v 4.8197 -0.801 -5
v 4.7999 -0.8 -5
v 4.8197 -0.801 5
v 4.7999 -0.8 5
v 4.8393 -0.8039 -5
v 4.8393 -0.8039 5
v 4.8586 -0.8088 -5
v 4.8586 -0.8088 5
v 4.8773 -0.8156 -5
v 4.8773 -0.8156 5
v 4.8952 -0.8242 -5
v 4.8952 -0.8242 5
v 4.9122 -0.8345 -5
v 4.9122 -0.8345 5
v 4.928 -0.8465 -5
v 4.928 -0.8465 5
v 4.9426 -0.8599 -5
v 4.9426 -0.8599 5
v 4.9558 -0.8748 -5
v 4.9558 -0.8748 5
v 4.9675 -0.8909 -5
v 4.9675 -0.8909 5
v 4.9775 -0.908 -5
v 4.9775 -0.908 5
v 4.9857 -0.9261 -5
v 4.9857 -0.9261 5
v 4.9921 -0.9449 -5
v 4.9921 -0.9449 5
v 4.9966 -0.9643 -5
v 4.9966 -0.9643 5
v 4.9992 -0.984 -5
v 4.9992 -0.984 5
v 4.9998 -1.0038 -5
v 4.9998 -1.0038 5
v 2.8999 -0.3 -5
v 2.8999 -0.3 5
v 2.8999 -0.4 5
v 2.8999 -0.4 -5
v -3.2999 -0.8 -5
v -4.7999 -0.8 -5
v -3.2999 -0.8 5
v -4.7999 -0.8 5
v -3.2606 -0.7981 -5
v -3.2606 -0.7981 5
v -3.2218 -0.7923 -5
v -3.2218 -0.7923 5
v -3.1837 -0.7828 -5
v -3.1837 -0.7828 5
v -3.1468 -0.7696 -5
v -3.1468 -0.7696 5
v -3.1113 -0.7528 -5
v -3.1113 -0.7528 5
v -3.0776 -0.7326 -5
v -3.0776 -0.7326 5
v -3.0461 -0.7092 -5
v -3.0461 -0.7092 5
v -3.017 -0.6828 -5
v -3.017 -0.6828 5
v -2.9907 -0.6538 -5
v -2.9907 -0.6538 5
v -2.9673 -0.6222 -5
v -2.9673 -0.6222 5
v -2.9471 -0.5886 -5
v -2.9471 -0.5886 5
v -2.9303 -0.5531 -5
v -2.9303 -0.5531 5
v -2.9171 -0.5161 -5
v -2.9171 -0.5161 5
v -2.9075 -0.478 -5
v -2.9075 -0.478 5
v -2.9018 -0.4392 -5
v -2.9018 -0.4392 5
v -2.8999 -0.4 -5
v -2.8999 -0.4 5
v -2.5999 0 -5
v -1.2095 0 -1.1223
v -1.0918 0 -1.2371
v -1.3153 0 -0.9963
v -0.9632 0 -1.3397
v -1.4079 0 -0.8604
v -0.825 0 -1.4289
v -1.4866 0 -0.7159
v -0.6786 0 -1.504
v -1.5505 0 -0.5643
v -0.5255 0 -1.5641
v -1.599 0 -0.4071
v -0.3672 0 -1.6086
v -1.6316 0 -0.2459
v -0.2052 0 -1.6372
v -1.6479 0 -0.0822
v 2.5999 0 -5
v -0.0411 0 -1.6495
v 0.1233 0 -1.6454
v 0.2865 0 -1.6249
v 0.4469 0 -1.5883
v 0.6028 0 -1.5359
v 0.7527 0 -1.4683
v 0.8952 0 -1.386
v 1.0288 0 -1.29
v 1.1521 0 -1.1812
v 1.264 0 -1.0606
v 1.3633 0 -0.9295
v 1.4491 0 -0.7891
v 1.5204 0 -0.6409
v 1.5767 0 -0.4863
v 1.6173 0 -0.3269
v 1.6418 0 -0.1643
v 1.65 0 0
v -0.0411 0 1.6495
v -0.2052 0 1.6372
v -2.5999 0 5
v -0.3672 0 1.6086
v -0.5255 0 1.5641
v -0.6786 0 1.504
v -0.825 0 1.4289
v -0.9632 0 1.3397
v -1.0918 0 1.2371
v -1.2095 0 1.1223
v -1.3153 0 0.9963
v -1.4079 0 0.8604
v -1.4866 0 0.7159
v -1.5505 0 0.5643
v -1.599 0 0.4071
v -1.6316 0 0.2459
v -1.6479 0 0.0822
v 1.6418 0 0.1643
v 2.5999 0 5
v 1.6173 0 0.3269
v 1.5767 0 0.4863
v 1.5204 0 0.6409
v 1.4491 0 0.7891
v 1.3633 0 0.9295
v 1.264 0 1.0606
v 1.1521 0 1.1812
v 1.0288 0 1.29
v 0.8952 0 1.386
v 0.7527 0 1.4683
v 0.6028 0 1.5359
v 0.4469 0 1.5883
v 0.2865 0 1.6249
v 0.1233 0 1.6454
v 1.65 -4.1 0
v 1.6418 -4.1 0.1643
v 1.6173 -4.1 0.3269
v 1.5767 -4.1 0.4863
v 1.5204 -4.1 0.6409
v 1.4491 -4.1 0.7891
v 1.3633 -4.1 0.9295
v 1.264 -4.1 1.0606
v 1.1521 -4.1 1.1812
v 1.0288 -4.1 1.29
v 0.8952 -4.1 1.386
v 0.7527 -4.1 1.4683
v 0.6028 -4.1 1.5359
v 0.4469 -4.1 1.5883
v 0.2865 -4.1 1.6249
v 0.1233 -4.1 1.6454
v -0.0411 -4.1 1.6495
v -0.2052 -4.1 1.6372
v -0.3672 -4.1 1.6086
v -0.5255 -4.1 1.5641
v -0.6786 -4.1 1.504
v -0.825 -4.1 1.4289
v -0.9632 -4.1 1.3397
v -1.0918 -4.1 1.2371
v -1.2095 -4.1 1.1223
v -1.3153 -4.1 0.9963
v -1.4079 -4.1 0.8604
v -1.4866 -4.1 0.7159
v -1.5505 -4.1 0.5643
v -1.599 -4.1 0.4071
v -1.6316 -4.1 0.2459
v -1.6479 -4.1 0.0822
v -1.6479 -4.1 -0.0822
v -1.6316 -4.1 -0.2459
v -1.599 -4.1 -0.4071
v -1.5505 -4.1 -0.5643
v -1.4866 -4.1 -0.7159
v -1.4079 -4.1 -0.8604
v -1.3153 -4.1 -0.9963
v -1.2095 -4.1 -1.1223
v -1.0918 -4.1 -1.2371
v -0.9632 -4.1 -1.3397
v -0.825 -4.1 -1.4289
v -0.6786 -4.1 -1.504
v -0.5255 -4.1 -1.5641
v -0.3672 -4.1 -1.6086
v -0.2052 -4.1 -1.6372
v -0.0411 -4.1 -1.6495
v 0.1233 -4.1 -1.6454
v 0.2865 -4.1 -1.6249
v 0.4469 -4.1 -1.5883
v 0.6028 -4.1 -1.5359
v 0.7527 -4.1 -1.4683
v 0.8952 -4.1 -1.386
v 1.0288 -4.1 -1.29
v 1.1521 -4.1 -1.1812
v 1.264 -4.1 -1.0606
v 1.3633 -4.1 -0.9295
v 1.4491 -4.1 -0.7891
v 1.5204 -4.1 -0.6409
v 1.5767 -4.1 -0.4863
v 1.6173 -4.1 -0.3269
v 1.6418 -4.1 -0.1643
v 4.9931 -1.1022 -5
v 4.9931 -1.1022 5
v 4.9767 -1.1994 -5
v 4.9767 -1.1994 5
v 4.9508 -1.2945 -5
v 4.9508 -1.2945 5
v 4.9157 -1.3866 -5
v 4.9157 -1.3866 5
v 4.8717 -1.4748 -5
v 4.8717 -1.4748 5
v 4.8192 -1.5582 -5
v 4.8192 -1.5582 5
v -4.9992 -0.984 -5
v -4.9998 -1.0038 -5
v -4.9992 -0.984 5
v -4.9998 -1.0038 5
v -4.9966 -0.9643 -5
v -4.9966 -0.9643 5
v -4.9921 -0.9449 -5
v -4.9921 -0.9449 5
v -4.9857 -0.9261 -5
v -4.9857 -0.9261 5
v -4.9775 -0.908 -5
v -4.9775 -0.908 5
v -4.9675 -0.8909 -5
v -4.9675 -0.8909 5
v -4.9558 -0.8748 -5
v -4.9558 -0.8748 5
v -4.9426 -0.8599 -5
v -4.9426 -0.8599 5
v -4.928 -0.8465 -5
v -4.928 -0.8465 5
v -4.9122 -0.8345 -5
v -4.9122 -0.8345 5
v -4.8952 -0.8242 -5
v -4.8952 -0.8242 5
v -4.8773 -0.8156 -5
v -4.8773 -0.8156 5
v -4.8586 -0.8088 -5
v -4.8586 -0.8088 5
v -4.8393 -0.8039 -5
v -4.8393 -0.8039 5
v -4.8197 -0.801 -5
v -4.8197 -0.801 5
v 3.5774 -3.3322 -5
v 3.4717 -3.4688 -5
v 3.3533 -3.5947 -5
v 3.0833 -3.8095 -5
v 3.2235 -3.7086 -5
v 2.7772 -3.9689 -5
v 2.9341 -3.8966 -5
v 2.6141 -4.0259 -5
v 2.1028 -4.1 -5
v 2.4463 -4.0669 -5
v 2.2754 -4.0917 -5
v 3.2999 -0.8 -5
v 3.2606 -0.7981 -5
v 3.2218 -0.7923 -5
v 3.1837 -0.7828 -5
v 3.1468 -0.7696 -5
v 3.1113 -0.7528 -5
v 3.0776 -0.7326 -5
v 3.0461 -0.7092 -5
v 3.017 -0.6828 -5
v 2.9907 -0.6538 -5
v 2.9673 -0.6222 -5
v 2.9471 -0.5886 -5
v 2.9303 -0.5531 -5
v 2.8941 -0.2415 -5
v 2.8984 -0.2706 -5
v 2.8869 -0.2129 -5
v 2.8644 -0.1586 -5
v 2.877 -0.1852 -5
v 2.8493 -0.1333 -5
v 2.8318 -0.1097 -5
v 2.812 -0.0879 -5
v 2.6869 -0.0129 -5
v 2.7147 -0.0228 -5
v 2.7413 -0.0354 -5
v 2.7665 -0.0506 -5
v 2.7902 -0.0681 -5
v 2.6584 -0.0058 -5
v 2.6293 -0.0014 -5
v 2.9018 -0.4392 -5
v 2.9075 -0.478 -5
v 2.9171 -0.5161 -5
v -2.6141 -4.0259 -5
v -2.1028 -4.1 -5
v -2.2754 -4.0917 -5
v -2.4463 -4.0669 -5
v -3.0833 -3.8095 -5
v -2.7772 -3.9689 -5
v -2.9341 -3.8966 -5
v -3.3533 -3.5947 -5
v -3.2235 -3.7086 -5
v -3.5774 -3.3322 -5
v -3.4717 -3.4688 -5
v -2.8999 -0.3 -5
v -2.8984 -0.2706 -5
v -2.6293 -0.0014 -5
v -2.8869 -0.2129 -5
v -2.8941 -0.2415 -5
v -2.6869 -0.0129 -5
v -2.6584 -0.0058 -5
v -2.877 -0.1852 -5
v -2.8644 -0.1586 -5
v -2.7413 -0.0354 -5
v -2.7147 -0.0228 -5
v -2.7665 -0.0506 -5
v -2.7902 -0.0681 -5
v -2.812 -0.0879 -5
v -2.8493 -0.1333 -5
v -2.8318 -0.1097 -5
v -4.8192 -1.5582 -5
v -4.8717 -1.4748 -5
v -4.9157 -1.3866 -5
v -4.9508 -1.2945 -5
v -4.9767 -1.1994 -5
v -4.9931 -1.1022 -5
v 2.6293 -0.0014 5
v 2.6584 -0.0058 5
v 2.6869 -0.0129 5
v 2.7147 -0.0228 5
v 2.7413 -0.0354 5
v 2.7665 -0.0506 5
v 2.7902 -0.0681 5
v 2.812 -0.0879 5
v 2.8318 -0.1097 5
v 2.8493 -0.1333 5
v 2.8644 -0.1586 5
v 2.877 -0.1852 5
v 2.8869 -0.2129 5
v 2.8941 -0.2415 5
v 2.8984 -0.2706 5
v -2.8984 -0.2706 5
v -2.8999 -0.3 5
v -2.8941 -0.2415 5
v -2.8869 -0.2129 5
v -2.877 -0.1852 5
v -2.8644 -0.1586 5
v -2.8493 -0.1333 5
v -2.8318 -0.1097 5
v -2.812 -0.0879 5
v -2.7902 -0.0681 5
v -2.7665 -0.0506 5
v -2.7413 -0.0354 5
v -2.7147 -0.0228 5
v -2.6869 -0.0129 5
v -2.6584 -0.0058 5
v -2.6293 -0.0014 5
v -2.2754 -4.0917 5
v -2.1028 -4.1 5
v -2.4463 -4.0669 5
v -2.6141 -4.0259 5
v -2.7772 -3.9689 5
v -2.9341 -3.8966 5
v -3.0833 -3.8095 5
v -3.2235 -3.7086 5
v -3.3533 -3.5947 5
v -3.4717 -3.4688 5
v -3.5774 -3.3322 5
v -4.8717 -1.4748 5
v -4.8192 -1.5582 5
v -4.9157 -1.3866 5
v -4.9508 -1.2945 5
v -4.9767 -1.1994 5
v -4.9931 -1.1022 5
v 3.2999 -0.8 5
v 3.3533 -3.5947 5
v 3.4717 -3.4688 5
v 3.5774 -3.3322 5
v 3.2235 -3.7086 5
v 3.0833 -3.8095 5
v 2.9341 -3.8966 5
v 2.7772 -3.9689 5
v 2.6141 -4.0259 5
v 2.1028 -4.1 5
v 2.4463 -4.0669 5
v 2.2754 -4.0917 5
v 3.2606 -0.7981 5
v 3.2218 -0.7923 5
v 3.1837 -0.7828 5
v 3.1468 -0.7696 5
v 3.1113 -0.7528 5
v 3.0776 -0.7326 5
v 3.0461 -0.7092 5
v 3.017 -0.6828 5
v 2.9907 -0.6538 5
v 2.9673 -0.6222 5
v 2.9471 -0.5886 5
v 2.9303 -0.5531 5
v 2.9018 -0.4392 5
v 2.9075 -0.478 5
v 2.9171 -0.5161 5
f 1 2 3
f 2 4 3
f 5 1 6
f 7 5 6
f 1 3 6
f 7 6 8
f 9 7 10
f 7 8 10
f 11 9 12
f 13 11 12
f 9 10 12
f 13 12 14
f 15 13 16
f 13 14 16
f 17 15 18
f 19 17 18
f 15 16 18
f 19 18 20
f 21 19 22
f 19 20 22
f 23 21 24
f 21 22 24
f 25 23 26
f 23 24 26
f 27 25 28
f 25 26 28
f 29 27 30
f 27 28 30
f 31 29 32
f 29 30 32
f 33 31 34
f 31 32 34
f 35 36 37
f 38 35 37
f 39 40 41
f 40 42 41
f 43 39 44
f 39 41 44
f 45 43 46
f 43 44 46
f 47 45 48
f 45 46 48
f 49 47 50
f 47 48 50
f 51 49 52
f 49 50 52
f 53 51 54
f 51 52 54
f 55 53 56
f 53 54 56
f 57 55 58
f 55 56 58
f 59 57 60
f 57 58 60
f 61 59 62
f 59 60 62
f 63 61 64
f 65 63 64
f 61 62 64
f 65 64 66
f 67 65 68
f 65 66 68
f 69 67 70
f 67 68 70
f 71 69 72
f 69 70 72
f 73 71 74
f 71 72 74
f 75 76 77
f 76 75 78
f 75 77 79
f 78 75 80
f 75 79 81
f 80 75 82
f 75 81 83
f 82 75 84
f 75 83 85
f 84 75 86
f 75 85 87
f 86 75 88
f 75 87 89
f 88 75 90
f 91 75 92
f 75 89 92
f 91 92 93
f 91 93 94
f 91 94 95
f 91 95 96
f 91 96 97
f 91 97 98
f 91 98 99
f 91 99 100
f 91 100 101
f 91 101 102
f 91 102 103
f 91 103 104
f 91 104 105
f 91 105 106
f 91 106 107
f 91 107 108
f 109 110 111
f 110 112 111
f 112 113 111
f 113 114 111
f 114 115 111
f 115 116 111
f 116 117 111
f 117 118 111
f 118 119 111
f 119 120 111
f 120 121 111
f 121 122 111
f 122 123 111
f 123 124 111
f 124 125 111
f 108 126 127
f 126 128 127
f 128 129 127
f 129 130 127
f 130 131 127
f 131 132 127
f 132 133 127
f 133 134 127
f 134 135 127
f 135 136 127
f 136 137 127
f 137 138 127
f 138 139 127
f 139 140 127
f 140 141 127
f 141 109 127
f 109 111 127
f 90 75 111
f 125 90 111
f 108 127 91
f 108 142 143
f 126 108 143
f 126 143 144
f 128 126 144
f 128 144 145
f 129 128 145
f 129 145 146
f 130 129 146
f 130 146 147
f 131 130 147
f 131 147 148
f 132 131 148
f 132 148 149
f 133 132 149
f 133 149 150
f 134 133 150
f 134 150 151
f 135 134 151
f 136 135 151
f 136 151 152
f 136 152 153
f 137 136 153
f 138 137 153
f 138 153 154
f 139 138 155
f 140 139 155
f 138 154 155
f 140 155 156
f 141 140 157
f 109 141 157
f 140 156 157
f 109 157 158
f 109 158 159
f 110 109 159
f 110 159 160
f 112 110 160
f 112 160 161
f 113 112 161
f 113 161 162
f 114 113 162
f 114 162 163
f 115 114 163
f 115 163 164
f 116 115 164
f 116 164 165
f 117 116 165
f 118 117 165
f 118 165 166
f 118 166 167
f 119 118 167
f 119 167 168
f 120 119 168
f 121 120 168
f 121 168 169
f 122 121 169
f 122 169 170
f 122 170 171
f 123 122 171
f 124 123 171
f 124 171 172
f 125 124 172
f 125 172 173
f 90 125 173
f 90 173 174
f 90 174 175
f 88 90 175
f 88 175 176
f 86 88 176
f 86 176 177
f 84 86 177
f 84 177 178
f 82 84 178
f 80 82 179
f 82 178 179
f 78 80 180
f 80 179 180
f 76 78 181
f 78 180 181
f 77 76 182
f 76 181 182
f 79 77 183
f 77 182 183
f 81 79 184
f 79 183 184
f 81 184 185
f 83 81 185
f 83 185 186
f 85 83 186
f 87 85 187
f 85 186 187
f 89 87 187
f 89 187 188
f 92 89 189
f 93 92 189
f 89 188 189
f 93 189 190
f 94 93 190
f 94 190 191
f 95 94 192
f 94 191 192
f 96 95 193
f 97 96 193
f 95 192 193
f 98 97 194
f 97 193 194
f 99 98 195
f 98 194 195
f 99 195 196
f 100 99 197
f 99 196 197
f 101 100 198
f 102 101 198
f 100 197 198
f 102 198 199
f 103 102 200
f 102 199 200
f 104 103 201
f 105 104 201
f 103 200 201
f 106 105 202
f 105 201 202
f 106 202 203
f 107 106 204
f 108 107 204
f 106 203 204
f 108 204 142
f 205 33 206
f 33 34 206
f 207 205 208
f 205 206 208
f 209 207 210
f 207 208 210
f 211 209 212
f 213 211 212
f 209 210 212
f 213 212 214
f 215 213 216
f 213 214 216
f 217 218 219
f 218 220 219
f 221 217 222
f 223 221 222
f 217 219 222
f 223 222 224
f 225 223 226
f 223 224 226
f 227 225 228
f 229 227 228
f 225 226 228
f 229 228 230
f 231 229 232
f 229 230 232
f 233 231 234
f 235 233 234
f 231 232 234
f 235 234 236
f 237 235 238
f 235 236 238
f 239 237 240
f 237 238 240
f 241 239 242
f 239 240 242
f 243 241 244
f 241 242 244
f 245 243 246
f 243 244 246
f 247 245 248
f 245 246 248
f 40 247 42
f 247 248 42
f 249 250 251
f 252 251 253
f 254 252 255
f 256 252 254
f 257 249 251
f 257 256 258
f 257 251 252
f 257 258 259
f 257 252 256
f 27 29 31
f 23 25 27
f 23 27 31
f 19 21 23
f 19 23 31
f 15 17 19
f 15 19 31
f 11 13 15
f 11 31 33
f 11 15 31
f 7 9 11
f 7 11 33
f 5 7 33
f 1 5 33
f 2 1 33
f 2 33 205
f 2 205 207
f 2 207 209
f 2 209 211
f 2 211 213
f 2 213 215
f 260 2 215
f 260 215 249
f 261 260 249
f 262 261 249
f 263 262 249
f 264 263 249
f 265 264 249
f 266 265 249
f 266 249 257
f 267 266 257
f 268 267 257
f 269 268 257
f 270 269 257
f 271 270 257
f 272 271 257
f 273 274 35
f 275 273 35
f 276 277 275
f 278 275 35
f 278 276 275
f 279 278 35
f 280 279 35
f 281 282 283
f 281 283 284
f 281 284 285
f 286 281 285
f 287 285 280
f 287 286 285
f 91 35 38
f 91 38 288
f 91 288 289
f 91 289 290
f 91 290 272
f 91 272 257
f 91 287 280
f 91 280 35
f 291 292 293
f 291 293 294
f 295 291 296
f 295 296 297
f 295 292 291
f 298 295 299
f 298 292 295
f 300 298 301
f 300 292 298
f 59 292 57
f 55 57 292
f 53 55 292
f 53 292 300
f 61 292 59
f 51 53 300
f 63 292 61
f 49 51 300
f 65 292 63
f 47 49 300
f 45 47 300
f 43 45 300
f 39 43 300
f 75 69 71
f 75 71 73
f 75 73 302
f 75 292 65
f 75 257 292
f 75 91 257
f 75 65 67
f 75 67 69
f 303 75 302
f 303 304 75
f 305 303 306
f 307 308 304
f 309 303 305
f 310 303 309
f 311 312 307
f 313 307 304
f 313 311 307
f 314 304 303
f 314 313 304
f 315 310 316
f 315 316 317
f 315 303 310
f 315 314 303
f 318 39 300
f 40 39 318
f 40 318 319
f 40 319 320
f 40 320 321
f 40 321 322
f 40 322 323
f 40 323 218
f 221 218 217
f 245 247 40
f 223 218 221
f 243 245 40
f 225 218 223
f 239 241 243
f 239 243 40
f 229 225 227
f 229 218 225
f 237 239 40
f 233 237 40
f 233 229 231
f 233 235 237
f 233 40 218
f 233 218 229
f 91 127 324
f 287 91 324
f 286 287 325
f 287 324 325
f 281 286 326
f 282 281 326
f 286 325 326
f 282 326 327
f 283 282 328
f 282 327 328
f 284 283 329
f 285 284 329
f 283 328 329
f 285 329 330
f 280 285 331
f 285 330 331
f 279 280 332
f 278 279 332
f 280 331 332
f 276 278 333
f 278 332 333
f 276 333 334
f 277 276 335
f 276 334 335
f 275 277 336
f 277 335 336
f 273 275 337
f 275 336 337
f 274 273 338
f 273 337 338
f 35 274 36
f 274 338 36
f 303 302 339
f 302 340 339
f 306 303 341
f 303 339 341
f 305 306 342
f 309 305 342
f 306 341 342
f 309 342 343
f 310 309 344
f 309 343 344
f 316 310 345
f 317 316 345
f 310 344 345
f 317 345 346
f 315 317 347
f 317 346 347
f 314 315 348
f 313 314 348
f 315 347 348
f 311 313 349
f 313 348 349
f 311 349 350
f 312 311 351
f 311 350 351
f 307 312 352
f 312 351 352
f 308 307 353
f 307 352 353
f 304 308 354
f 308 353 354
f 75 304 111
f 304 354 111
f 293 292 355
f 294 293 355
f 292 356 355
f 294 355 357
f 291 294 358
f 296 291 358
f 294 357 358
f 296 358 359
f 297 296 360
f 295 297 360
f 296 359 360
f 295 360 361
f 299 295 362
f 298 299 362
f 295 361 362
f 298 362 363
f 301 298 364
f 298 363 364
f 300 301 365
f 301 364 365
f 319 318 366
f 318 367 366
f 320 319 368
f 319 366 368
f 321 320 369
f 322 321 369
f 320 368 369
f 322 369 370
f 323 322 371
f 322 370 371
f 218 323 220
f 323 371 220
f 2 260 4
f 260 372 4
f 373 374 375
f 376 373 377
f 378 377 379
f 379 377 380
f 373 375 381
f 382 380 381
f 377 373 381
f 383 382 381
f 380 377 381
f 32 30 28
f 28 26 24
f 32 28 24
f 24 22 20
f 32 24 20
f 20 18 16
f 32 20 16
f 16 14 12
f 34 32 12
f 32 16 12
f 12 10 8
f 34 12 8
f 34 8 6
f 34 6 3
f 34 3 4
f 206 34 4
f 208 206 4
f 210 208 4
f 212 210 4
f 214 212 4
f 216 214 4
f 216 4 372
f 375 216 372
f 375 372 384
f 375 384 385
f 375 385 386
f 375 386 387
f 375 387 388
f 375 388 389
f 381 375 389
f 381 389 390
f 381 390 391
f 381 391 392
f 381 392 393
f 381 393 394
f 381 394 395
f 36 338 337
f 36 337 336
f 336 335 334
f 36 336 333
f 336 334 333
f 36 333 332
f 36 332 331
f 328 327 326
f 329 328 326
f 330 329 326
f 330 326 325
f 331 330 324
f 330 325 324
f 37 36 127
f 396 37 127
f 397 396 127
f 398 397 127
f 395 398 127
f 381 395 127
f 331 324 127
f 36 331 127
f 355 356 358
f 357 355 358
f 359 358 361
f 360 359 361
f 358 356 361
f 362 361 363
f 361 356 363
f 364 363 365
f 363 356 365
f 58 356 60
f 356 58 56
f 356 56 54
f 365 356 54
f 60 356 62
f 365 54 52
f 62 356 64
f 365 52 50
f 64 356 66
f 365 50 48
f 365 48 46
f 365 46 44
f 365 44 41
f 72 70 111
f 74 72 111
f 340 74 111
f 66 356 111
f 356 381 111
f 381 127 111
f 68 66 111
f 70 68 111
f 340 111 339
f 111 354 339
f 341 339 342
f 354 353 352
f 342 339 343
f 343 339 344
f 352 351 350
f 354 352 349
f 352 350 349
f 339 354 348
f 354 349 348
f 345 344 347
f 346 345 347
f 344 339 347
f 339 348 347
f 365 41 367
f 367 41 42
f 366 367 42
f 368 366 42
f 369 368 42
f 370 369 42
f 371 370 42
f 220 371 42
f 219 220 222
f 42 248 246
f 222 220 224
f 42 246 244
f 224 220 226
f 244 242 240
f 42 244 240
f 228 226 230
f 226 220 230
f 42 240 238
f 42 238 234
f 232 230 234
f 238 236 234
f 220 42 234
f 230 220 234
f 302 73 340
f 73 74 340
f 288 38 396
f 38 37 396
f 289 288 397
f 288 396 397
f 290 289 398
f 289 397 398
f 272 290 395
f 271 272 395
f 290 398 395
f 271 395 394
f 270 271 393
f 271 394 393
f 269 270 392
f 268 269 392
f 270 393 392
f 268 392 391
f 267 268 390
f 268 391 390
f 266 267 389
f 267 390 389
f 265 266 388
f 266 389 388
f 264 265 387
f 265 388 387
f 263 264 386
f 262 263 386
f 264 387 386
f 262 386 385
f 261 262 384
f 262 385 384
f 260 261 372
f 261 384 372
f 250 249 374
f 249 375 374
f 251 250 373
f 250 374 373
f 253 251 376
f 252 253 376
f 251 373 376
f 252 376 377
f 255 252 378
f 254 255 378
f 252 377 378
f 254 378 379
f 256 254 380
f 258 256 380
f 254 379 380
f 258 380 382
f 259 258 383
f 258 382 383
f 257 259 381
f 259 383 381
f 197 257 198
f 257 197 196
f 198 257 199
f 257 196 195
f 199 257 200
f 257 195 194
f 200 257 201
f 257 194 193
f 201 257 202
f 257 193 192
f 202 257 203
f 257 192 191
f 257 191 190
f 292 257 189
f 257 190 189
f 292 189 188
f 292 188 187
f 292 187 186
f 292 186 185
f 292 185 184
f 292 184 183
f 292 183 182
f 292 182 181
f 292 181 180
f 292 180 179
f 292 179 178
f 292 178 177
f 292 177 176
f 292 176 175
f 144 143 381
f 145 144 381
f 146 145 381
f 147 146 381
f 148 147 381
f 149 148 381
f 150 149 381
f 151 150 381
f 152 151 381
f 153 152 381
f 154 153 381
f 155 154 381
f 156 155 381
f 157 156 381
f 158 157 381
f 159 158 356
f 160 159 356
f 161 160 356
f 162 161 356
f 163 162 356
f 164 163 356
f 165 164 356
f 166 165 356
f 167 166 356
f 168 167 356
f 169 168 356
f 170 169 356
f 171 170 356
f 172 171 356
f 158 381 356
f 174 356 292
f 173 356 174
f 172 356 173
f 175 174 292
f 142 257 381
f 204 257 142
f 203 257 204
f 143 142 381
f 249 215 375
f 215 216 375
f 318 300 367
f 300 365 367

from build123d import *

# Parameters (mm, degrees)
EXTRUDE_1_DEPTH = 5
M4X0_7_1_D      = 3.3


with BuildPart() as part:
    # ｽｹｯﾁ2 → 押し出し1 (new body, symmetric)
    with BuildSketch(Plane.XY):
        with BuildLine():
            Line((2.89985476, -0.30000001), (2.89985476, -0.39999919))
            ThreePointArc((2.89985476, -0.39999919), (3.017012051, -0.68284191), (3.29985477, -0.7999992))
            Line((3.29985477, -0.7999992), (4.799856544, -0.7999992))
            ThreePointArc((4.799856544, -0.7999992), (4.942617804, -0.859930564), (4.999820293, -1.003806973))
            ThreePointArc((4.999820293, -1.003806973), (4.950834117, -1.294473494), (4.819233264, -1.558230745))
            Line((4.819233264, -1.558230745), (3.577430107, -3.332233905))
            ThreePointArc((3.577430107, -3.332233905), (2.934071419, -3.896562924), (2.102813019, -4.100001158))
            Line((2.102813019, -4.100001158), (-2.102813019, -4.100001158))
            ThreePointArc((-2.102813019, -4.100001158), (-2.934071419, -3.896562924), (-3.577430107, -3.332233905))
            Line((-3.577430107, -3.332233905), (-4.819233264, -1.558230745))
            ThreePointArc((-4.819233264, -1.558230745), (-4.950834117, -1.294473494), (-4.999820293, -1.003806973))
            ThreePointArc((-4.999820293, -1.003806973), (-4.942617804, -0.859930564), (-4.799856544, -0.7999992))
            Line((-4.799856544, -0.7999992), (-3.29985477, -0.7999992))
            ThreePointArc((-3.29985477, -0.7999992), (-3.017012051, -0.68284191), (-2.89985476, -0.39999919))
            Line((-2.89985476, -0.39999919), (-2.89985476, -0.30000001))
            ThreePointArc((-2.89985476, -0.30000001), (-2.811986792, -0.087867969), (-2.59985475, 0))
            Line((-2.59985475, 0), (2.59985475, 0))
            ThreePointArc((2.59985475, 0), (2.811986792, -0.087867969), (2.89985476, -0.30000001))
        make_face()
    extrude(amount=EXTRUDE_1_DEPTH, both=True)

    # M4x0.7 ねじ穴1 (through all)
    with Locations(Plane(origin=(0, 0, 0), x_dir=(-1, 0, 0), z_dir=(0, 1, 0))):
        with Locations((0, 0)):
            Hole(M4X0_7_1_D / 2)


solid = part.part
